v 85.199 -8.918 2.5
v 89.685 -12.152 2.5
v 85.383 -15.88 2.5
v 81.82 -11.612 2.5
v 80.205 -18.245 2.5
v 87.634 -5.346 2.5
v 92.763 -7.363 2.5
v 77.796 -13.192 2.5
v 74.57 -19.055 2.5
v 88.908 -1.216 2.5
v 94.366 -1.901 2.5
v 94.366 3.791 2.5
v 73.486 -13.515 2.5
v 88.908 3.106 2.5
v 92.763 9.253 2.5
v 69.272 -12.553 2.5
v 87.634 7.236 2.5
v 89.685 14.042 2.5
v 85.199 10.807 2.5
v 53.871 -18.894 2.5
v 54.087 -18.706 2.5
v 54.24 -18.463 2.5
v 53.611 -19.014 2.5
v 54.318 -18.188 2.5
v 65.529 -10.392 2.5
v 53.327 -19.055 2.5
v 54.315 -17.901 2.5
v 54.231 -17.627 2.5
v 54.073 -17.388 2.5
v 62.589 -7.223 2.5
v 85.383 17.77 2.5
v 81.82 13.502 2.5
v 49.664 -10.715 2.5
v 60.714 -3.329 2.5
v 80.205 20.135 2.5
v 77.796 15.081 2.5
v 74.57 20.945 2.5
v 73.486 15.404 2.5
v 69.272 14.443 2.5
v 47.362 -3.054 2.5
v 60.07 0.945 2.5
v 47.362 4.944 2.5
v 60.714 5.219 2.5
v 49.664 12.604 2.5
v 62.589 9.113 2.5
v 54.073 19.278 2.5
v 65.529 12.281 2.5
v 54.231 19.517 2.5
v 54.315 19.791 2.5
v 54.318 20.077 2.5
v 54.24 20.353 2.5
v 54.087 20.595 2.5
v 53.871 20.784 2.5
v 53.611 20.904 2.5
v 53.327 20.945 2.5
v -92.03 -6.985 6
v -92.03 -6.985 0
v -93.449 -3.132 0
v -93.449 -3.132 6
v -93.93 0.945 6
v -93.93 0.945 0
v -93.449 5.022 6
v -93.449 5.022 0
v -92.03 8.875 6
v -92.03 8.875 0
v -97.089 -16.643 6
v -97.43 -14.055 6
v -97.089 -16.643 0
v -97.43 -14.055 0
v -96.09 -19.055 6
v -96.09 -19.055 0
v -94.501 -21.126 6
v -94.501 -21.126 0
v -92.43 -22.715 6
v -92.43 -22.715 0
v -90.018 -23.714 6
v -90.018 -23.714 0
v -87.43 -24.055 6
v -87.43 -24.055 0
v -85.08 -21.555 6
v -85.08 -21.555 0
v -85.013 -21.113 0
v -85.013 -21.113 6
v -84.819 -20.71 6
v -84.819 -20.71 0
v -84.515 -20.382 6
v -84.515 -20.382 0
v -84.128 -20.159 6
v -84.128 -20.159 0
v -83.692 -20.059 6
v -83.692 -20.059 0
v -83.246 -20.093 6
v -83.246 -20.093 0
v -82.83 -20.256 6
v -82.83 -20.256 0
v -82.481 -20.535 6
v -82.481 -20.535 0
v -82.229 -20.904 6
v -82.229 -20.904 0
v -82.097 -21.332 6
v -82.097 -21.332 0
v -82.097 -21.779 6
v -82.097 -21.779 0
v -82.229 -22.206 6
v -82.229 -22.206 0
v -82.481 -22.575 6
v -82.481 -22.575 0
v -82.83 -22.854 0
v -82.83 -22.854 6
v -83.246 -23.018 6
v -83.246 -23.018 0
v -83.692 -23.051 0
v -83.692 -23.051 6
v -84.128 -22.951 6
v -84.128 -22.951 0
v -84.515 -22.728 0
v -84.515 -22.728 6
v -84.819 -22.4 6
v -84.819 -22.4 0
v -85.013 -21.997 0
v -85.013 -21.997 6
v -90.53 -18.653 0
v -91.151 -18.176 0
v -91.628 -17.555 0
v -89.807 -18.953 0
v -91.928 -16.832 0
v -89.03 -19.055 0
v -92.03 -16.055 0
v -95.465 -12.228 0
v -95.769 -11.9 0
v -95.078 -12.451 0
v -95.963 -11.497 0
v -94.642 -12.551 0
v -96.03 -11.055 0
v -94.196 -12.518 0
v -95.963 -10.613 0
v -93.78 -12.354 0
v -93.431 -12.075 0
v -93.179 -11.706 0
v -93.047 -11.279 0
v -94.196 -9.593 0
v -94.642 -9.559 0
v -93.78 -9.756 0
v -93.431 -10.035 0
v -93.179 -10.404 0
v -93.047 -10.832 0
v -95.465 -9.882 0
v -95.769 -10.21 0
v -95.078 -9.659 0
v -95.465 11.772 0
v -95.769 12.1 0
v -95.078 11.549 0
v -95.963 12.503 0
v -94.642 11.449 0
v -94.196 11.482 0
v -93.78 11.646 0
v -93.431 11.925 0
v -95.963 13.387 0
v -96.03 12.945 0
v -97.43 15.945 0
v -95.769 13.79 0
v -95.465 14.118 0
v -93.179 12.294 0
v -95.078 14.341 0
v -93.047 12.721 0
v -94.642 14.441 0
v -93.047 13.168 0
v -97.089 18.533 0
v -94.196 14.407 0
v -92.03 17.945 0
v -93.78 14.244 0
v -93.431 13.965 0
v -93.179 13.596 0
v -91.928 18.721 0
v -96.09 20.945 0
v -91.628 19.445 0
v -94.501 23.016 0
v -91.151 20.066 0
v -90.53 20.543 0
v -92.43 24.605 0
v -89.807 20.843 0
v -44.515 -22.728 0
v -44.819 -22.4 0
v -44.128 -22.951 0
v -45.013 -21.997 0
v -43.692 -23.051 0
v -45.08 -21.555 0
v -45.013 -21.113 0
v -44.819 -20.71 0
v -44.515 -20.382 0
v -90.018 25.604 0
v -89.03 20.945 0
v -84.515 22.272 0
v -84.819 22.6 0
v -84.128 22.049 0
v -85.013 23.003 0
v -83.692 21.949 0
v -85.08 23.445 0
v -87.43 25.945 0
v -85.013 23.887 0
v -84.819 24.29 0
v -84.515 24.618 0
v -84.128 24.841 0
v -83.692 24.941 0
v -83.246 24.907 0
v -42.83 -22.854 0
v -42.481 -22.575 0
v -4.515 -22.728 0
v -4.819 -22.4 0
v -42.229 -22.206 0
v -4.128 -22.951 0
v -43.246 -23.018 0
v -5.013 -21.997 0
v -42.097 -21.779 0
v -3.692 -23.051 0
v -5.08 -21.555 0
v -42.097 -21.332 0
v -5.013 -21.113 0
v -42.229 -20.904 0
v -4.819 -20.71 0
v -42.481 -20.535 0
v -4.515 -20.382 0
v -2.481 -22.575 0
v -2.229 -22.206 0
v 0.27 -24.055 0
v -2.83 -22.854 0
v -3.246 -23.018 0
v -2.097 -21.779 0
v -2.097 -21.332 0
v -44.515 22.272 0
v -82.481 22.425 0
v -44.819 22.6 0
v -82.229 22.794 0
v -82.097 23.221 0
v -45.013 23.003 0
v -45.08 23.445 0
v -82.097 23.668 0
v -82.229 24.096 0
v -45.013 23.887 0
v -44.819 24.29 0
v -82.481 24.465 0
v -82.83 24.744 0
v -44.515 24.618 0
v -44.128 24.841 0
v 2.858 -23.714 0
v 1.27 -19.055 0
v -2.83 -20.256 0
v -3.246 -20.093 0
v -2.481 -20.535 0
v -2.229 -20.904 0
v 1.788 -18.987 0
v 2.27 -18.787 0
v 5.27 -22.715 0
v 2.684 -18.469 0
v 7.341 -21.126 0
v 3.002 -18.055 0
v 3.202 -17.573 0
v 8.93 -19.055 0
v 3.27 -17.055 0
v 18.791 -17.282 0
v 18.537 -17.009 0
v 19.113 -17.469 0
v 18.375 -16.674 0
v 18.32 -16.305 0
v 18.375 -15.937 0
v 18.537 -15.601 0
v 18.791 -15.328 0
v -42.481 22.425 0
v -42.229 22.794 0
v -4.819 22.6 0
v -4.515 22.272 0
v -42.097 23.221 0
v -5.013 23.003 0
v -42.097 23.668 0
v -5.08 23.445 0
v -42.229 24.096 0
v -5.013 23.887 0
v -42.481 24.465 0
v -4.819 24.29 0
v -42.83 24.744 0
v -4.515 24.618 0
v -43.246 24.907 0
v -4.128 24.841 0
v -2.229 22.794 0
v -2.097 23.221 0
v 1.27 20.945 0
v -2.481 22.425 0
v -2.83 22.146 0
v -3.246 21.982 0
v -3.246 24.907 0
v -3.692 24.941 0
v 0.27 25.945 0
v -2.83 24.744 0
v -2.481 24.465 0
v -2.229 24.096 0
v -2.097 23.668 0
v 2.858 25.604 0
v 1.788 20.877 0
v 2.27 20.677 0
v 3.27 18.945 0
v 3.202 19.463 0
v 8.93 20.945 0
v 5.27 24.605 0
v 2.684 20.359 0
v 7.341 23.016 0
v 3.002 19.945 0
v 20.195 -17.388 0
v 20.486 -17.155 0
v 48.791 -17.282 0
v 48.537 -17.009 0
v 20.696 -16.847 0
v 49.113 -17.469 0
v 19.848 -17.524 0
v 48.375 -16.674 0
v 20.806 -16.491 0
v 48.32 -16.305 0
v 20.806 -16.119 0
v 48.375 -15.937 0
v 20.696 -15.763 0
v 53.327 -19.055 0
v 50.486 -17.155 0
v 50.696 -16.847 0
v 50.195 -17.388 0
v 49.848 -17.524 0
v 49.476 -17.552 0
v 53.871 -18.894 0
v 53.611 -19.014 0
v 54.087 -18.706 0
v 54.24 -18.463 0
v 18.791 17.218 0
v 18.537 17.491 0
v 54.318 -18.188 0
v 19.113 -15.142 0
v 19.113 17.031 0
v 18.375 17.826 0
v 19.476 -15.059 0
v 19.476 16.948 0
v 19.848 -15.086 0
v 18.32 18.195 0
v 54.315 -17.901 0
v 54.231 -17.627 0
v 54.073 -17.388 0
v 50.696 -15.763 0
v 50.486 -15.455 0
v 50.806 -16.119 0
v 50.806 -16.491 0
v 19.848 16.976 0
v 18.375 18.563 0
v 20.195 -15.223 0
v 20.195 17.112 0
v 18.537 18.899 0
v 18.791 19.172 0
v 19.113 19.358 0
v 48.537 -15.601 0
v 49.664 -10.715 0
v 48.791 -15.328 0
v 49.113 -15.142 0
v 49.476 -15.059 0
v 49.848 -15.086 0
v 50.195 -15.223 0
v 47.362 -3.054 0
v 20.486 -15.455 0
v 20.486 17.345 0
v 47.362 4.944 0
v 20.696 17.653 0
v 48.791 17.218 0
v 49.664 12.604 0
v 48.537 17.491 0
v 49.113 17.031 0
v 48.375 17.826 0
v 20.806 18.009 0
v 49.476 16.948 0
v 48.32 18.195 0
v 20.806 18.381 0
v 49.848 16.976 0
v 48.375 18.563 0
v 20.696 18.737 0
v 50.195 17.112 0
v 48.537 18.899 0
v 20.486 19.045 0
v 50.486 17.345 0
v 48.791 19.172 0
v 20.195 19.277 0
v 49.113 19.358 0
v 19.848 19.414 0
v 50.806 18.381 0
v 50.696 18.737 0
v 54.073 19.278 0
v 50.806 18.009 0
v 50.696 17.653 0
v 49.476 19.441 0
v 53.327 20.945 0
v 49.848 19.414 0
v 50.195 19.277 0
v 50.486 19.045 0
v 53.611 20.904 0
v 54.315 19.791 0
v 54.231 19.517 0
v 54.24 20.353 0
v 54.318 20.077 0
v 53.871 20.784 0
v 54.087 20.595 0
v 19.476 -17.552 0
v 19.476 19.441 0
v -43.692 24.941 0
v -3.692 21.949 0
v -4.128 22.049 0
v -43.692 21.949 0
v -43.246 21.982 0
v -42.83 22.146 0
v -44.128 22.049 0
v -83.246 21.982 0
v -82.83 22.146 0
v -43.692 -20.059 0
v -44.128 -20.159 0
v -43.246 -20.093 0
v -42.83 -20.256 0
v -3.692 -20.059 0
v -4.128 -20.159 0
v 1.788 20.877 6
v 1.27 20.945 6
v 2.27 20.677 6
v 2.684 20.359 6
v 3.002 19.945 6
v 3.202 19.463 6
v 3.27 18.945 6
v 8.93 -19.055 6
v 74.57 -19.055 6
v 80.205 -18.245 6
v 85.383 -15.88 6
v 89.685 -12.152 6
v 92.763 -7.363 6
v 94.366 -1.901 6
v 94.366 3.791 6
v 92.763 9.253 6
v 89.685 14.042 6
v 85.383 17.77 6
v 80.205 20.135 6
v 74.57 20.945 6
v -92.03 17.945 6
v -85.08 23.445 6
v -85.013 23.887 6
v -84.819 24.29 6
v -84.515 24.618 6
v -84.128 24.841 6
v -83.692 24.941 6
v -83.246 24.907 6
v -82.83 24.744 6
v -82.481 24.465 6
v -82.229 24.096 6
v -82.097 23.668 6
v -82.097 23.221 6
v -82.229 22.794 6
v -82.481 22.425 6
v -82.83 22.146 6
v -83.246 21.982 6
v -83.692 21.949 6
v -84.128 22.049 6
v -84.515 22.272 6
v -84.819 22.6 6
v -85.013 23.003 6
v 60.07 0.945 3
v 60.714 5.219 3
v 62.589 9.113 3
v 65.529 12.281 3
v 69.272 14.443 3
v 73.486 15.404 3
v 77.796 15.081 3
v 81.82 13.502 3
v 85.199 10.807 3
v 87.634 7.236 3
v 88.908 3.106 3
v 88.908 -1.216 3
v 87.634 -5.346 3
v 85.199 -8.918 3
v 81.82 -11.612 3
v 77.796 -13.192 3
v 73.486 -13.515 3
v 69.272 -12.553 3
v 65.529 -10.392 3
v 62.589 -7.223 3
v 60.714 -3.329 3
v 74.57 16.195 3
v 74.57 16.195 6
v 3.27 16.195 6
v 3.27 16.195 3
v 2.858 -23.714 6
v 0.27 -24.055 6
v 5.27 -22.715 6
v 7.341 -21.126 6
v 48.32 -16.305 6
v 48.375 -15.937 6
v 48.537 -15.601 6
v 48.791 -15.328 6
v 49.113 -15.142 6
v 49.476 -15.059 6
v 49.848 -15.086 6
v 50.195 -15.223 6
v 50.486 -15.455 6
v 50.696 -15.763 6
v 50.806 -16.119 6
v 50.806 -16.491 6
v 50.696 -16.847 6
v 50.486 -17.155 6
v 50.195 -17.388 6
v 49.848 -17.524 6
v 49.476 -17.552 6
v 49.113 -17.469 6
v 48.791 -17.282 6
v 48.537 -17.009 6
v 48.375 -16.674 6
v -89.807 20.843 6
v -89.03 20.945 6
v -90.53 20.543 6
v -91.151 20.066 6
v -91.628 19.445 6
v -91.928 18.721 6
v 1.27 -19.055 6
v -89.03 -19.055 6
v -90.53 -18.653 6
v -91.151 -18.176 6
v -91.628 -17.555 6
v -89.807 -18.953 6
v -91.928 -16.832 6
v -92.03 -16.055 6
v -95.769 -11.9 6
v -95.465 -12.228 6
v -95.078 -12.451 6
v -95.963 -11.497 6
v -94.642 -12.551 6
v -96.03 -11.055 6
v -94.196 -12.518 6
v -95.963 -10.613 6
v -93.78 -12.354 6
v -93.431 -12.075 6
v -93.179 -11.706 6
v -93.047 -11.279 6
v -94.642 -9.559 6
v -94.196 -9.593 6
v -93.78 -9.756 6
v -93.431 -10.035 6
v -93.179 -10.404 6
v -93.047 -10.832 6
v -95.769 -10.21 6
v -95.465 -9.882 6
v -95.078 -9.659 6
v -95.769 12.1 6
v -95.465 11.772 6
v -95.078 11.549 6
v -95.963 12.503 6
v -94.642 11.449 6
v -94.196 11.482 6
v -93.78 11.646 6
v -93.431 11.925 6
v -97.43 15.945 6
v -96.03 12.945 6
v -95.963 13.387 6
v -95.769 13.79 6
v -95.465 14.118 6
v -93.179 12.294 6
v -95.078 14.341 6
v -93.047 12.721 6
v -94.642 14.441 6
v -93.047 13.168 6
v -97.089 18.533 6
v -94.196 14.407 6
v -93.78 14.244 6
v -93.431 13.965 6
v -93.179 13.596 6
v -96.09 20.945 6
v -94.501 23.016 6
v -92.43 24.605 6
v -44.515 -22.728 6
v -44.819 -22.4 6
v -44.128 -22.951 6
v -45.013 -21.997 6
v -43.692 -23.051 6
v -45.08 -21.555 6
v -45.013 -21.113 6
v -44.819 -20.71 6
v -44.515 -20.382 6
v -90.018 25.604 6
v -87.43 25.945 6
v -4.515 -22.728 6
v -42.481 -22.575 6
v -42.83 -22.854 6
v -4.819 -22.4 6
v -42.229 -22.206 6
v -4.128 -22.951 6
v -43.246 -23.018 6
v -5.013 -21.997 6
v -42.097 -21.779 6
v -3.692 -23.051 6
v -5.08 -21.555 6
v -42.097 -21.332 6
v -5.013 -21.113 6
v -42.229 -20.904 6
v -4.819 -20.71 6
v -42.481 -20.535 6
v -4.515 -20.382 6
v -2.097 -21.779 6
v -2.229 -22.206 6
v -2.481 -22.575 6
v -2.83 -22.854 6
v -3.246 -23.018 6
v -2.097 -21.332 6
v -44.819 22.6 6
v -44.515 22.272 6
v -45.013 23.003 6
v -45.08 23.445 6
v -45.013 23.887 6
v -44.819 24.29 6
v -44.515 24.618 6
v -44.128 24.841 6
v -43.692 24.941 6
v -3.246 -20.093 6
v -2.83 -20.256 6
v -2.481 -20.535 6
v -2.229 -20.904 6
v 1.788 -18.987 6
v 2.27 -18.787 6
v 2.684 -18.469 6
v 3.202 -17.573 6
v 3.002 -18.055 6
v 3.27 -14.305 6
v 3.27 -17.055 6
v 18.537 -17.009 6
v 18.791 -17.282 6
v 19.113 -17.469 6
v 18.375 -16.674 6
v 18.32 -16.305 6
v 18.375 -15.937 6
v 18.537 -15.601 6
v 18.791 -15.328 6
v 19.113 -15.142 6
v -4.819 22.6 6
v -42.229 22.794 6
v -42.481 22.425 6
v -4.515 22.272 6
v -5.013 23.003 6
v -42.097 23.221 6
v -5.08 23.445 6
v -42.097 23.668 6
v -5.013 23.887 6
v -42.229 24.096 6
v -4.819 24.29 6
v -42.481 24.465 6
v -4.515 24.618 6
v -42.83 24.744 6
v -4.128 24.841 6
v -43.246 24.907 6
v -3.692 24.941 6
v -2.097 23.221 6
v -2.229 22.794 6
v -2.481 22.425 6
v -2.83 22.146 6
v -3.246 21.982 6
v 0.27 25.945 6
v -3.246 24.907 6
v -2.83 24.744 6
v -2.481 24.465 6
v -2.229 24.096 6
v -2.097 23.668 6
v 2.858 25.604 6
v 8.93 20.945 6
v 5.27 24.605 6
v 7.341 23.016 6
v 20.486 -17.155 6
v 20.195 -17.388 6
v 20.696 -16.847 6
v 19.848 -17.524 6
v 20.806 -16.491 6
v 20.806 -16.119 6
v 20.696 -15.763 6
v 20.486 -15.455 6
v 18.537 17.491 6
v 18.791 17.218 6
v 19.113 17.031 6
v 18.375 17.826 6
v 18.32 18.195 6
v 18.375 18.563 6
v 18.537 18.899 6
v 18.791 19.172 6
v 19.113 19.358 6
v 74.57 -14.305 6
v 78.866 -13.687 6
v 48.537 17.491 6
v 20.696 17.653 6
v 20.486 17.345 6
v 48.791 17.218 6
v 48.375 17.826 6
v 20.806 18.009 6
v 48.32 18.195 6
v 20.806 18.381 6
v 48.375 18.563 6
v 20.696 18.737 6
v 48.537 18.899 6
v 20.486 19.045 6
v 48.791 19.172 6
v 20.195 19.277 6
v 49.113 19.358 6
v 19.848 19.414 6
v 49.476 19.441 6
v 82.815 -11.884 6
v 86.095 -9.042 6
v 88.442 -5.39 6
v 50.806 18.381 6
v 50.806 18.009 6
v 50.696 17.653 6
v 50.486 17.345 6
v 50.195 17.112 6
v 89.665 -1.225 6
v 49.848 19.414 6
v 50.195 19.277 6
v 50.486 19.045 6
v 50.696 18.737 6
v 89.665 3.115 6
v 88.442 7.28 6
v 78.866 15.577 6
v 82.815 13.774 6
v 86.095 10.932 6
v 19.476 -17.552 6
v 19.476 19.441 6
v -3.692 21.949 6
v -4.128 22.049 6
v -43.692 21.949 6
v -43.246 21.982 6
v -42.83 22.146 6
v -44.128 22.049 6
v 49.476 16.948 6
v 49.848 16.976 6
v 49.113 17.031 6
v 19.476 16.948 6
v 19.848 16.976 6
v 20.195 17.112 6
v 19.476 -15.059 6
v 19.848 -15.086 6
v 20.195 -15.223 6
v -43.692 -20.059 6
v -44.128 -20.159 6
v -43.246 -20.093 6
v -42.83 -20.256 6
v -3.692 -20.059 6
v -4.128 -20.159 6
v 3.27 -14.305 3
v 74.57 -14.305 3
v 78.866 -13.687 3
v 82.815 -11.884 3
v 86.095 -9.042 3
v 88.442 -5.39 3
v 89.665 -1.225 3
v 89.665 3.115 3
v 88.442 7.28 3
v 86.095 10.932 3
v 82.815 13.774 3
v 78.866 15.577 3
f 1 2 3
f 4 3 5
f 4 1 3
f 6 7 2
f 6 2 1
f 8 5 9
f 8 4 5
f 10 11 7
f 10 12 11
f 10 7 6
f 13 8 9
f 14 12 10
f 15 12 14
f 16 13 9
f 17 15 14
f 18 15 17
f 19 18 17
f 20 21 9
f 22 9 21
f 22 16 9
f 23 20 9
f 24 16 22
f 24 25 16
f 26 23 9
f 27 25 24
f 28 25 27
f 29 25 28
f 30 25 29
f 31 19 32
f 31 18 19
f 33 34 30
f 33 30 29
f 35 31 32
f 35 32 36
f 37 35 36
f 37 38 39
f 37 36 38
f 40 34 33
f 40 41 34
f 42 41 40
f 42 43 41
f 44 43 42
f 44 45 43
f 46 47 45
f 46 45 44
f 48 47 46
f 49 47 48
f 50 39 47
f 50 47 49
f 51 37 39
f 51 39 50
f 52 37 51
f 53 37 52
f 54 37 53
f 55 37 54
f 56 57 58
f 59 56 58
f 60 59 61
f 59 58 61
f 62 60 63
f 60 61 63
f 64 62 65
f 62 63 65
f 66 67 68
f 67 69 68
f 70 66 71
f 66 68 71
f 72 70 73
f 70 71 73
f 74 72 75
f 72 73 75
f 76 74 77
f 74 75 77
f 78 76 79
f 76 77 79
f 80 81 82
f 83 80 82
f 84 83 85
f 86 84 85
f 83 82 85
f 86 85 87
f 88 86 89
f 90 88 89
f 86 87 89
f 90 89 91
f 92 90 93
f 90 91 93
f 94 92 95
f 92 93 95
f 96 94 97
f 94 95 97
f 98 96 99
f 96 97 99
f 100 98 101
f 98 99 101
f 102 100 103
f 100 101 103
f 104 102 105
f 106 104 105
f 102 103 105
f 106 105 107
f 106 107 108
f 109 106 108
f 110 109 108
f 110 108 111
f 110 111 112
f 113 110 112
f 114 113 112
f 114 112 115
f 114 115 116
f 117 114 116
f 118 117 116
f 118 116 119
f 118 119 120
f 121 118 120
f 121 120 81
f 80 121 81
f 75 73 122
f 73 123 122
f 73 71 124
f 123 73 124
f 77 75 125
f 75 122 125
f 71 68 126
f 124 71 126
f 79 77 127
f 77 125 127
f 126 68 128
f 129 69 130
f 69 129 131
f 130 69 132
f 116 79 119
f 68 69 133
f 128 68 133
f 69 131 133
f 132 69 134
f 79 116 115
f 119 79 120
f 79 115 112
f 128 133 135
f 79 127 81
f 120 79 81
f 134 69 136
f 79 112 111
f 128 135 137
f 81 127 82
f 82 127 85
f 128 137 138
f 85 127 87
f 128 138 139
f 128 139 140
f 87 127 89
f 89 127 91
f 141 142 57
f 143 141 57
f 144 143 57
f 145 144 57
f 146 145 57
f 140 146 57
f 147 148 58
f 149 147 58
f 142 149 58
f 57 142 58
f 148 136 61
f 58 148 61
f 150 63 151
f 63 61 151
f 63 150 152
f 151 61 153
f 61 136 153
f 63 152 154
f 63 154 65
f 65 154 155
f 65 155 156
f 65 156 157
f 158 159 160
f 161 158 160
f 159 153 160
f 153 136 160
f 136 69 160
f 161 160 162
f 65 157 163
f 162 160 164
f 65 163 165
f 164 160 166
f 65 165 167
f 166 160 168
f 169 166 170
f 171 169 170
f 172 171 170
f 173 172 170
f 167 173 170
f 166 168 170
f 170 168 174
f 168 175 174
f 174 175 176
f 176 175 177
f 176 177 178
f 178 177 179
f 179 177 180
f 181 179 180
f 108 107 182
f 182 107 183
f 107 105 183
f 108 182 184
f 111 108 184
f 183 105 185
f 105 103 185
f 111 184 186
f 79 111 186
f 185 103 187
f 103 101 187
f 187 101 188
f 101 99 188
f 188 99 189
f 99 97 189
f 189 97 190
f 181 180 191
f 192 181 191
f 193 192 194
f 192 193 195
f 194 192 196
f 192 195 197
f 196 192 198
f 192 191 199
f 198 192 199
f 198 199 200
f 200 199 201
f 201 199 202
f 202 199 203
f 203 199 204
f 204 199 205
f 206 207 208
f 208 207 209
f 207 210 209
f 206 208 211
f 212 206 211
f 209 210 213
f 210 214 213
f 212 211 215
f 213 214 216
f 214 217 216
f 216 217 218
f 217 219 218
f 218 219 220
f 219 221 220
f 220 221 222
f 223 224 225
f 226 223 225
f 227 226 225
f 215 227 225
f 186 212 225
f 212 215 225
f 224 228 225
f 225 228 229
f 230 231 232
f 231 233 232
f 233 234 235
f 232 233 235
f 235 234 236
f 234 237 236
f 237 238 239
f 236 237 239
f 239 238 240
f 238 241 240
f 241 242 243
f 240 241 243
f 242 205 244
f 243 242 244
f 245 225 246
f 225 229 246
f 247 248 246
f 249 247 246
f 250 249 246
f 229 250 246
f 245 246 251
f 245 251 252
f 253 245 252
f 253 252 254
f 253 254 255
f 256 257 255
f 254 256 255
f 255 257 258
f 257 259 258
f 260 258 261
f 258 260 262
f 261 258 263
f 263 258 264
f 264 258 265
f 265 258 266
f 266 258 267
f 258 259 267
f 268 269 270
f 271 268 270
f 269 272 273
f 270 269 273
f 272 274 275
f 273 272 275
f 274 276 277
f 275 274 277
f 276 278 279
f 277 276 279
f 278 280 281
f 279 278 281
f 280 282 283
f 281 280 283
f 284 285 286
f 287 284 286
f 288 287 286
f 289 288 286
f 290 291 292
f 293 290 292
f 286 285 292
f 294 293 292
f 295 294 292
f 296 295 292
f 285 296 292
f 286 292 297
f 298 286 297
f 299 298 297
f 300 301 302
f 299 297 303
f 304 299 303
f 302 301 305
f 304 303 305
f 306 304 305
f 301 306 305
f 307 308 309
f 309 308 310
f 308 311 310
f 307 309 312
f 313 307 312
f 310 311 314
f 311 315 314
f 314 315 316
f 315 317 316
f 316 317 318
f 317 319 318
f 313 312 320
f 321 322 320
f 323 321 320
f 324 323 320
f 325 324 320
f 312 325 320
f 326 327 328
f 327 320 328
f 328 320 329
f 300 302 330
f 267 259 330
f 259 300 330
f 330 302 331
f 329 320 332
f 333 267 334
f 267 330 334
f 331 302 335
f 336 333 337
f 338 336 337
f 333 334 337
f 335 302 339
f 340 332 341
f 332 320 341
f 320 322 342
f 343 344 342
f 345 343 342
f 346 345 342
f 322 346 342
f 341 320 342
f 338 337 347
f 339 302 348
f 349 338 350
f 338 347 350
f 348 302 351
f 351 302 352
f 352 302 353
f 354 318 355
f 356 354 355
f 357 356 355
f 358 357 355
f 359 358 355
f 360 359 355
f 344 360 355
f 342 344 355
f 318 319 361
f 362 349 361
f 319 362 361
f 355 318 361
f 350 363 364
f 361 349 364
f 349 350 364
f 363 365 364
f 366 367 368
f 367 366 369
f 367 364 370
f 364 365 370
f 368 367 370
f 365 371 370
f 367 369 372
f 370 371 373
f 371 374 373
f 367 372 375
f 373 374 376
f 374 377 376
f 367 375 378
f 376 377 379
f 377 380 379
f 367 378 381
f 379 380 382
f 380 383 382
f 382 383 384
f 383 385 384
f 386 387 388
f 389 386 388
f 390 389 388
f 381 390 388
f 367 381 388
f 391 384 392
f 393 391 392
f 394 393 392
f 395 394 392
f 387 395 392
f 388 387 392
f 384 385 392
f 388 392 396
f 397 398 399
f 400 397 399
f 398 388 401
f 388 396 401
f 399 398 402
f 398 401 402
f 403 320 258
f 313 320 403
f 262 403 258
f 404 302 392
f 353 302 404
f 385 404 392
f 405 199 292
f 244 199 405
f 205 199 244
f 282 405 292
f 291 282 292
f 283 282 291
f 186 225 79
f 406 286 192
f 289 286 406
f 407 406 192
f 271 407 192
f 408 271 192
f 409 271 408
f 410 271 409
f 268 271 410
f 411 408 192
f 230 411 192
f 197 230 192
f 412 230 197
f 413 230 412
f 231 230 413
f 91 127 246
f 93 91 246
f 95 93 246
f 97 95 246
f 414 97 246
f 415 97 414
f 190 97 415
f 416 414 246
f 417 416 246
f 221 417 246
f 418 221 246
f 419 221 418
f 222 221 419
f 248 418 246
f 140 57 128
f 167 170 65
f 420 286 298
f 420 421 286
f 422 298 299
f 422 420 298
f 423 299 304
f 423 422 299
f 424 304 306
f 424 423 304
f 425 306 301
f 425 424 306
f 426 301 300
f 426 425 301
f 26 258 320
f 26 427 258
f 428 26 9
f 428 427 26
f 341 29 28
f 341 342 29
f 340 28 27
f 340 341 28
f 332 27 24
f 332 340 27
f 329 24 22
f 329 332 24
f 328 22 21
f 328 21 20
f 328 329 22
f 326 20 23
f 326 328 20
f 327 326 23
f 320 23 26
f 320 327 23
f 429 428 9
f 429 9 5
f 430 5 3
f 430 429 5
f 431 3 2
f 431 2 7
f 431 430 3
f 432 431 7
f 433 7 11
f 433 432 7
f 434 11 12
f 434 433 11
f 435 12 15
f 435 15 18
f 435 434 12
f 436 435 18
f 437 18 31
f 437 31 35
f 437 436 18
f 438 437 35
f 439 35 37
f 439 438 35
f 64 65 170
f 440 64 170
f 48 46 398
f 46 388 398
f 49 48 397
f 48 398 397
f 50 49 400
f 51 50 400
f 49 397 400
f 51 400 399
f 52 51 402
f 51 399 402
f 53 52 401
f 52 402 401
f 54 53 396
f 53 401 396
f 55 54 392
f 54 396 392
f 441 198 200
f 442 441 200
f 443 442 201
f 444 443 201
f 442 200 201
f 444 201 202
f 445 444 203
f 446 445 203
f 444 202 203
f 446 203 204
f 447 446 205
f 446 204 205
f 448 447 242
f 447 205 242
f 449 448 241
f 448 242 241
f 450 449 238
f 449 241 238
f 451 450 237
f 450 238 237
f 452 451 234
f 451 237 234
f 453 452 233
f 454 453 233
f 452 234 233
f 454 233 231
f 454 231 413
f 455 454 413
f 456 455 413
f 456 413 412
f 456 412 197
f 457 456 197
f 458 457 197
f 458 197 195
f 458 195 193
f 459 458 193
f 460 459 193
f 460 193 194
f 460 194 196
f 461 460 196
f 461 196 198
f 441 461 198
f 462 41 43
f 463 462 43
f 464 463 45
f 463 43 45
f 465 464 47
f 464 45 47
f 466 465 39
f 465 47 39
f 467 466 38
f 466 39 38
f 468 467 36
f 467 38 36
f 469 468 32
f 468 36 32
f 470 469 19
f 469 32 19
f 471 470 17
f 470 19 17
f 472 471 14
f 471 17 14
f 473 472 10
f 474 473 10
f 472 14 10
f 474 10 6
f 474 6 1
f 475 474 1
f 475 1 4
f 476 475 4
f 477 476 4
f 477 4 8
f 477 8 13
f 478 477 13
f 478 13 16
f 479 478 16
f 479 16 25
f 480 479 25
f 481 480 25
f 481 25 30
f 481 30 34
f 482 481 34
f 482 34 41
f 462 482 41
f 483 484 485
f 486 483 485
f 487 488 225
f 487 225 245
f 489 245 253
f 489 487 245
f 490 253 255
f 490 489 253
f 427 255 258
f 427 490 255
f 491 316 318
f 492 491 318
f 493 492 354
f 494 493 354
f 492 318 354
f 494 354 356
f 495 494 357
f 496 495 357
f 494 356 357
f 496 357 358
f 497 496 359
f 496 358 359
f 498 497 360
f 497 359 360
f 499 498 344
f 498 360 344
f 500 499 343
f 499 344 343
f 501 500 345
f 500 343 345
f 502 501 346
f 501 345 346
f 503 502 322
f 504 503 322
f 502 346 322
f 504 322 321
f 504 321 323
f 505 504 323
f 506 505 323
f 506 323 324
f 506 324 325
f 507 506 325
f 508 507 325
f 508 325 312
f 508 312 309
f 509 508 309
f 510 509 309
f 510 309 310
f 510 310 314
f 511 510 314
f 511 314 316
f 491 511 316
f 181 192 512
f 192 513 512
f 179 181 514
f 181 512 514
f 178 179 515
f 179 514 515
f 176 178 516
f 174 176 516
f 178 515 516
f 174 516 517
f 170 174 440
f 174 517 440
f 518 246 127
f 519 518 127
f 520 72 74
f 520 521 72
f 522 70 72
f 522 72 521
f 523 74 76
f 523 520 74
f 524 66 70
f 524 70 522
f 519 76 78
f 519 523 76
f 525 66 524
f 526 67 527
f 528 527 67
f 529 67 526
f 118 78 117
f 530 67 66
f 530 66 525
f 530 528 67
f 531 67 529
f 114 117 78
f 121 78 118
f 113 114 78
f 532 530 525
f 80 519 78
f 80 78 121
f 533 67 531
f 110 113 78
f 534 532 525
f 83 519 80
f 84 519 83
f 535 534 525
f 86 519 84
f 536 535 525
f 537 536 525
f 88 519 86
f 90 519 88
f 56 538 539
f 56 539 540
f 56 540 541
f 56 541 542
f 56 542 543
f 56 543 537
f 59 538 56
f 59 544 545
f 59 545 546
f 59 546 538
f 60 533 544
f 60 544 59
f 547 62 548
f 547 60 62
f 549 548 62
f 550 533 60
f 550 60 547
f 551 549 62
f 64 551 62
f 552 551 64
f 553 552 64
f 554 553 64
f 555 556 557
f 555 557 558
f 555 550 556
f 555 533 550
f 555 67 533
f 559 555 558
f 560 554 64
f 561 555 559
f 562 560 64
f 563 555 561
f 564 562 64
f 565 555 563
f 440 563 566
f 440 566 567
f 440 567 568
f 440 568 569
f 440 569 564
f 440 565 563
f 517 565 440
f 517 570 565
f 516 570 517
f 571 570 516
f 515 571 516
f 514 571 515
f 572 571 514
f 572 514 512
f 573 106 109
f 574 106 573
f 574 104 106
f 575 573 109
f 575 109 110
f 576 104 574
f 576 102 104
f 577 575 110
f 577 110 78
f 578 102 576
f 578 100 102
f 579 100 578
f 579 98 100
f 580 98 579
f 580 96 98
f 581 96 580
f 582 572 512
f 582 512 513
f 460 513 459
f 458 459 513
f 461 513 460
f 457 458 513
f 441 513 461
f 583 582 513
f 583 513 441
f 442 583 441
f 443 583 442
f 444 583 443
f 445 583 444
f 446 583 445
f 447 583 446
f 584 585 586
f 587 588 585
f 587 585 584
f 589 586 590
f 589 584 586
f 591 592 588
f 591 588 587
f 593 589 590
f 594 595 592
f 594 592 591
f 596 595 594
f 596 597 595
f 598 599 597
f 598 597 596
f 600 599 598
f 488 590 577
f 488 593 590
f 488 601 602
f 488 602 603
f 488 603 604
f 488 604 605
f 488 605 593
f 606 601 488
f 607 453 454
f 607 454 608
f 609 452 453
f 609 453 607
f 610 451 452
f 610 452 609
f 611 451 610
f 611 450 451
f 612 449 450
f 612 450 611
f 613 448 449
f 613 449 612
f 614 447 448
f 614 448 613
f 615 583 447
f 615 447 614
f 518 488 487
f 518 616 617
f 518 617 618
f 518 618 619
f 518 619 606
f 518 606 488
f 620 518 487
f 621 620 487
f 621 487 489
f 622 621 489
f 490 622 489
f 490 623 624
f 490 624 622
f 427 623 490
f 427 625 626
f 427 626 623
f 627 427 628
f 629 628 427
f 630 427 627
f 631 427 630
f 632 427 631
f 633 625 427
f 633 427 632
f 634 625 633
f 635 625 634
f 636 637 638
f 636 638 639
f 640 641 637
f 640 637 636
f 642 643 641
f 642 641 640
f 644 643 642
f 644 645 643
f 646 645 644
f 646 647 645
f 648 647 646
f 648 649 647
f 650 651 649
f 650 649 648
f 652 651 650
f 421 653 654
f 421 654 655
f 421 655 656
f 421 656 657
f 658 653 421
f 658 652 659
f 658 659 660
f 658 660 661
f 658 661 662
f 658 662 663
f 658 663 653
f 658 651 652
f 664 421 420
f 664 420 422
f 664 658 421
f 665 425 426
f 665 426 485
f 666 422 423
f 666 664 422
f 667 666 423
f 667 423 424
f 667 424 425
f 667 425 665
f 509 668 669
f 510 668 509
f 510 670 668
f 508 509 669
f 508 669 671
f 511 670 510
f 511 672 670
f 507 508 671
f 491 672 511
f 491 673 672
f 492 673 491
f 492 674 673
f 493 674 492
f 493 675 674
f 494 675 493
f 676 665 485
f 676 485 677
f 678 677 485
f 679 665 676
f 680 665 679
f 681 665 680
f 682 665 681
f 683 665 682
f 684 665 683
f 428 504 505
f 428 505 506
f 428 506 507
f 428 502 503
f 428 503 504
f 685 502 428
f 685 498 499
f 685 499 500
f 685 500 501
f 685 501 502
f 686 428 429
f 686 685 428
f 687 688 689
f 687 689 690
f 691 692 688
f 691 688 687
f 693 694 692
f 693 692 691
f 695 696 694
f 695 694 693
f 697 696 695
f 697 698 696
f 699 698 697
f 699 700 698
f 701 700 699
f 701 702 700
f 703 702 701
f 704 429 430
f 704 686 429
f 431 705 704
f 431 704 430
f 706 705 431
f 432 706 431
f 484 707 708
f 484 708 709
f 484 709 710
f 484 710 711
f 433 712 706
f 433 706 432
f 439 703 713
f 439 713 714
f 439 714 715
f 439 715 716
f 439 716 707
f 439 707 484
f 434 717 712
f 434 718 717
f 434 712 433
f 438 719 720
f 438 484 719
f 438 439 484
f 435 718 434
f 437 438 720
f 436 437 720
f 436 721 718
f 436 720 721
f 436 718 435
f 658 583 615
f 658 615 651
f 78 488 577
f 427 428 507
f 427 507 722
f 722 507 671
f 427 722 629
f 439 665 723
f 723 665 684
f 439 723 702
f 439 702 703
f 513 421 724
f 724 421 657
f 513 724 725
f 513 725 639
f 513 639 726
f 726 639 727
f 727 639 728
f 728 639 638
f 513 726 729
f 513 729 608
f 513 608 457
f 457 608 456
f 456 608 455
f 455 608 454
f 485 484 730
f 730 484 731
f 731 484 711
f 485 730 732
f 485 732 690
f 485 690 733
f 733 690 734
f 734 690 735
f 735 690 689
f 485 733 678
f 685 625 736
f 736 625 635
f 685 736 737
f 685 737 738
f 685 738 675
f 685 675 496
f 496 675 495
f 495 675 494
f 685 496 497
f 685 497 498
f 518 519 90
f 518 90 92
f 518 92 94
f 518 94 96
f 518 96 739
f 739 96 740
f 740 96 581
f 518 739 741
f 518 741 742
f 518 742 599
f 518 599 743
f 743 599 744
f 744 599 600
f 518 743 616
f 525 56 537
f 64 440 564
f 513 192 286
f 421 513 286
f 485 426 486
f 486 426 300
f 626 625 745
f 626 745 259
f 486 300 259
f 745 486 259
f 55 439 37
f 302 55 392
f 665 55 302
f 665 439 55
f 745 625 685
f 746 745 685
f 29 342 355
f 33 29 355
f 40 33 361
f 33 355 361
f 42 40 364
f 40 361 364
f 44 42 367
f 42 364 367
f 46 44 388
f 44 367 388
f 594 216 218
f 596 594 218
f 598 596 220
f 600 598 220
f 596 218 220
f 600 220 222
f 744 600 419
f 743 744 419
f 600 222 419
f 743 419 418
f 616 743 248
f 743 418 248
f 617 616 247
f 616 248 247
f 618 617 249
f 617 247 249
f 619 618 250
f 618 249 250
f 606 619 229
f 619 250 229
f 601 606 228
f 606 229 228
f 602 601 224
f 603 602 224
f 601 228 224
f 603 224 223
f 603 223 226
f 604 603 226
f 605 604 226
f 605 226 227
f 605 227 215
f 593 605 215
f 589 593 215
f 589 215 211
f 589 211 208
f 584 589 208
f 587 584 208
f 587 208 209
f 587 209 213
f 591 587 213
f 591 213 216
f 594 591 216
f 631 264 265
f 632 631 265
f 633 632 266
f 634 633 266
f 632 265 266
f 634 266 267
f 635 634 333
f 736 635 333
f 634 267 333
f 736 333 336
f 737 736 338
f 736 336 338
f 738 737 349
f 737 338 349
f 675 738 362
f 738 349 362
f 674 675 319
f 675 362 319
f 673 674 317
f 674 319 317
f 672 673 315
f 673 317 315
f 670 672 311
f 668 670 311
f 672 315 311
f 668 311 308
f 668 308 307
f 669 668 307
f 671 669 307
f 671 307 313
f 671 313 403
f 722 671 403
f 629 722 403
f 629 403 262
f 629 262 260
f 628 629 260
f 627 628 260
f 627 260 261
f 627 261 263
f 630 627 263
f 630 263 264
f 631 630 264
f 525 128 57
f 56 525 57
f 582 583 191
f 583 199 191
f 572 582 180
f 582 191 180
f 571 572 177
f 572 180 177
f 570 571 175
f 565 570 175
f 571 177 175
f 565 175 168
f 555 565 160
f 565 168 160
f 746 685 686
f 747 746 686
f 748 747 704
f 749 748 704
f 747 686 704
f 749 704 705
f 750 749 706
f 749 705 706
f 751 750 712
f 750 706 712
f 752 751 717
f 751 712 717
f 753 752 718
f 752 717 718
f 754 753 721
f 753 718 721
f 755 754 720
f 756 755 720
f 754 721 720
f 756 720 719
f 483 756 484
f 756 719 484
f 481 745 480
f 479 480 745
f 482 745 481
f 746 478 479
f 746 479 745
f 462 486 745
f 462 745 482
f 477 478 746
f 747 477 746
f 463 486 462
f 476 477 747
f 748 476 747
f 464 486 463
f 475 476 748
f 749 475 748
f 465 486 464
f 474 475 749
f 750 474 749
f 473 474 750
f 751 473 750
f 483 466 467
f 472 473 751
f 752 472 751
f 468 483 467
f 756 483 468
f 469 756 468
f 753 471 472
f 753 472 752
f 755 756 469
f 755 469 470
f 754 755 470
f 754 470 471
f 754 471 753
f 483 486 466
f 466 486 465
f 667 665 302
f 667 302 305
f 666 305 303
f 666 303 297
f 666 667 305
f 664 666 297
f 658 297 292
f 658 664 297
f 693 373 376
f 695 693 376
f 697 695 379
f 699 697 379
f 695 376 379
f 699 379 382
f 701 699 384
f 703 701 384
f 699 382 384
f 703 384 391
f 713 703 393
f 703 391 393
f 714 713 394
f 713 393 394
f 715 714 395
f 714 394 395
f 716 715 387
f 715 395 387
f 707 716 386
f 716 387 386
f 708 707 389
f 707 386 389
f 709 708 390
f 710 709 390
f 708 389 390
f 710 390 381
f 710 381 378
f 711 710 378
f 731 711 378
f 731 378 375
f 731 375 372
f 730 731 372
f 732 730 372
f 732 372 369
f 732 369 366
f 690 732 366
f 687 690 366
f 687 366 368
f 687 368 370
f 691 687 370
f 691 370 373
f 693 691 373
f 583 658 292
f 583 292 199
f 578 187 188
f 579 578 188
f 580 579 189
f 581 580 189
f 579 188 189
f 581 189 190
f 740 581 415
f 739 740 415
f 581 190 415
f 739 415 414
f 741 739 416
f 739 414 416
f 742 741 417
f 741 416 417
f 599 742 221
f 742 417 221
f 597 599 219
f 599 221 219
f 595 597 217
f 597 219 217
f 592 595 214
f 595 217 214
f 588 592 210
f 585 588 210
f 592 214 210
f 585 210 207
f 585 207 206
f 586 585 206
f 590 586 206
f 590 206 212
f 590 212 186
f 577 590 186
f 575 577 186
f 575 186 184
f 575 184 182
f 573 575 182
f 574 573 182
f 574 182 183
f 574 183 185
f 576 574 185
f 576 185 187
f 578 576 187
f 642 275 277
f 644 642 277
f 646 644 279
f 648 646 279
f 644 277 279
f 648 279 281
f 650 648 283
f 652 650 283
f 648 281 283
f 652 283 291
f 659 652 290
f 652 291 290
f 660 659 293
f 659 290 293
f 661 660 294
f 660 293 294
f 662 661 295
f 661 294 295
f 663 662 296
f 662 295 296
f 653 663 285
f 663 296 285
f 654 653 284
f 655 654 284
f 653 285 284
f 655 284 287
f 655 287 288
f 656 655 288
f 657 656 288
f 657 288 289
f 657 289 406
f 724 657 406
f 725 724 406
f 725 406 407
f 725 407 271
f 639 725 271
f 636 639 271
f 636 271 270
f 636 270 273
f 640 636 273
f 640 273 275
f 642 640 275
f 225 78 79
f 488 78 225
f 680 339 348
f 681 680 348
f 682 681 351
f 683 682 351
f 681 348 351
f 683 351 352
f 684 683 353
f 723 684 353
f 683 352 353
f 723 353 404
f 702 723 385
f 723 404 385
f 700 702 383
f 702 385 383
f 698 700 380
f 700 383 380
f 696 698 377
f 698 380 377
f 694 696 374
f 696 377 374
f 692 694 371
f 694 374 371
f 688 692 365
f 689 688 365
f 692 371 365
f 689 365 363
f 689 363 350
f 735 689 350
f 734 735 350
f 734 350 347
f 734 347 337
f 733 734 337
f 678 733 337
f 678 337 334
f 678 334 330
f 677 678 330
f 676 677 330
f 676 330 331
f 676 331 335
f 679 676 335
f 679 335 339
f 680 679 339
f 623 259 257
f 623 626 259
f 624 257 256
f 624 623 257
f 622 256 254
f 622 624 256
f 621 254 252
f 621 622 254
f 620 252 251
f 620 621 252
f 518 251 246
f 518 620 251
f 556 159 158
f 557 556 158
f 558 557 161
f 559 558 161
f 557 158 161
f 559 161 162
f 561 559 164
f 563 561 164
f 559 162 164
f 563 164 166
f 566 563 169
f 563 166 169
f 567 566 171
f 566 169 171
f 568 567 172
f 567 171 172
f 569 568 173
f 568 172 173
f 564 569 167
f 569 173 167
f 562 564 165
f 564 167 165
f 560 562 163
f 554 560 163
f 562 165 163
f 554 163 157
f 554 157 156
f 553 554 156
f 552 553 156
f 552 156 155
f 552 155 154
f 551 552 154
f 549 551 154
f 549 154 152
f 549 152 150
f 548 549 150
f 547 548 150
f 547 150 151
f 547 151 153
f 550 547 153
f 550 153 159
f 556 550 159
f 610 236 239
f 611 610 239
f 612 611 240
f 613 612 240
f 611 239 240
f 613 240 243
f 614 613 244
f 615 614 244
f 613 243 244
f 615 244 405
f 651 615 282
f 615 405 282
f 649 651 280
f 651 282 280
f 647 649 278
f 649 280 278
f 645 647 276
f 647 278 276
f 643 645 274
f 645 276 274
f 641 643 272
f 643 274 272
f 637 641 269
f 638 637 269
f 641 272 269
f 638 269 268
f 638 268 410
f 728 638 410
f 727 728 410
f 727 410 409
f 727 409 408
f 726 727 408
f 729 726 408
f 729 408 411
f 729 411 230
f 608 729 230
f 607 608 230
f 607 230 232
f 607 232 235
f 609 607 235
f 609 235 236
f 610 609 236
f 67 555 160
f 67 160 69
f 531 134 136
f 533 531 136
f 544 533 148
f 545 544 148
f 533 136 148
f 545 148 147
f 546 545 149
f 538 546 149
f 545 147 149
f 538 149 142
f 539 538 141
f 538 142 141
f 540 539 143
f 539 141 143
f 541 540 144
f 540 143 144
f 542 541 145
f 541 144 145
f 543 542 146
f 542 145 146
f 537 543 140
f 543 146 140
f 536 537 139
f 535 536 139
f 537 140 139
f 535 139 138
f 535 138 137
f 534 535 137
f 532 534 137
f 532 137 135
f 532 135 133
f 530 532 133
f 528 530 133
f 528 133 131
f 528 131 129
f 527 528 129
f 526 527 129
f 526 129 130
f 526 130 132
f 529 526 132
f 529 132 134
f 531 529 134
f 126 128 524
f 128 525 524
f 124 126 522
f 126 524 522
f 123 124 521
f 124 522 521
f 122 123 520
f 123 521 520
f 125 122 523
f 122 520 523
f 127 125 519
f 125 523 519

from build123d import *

# Parameters (mm, degrees)
BOSS_EXTRUDE1_DEPTH       = 6
CUT_EXTRUDE1_DEPTH        = 102.003801713
CUT_EXTRUDE2_DEPTH        = 3
F_2_CLEARANCE_HOLE1_D     = 2.5
F_1_1_8_CLEARANCE_HOLE1_D = 29
F_3_CLEARANCE_HOLE1_D     = 3
FILLET1_R                 = 2
FILLET2_R                 = 3
FILLET3_R                 = 10
SKETCH10_R                = 27.5
CUT_EXTRUDE3_DEPTH        = 2.5
FILLET4_R                 = 1


with BuildPart() as part:
    # Sketch1 → Boss-Extrude1 (new body)
    with BuildSketch(Plane.XY.offset(6)):
        with BuildLine():
            Line((74.569864729, 20.944878138), (8.930118766, 20.944878138))
            ThreePointArc((8.930118766, 20.944878138), (5.269864729, 24.605132176), (0.269864729, 25.944878138))
            Line((0.269864729, 25.944878138), (-97.430135271, 25.944878138))
            Line((-97.430135271, 25.944878138), (-97.430135271, -24.055121862))
            Line((-97.430135271, -24.055121862), (0.269864729, -24.055121862))
            ThreePointArc((0.269864729, -24.055121862), (5.269864729, -22.7153759), (8.930118767, -19.055121862))
            Line((8.930118767, -19.055121862), (74.569864729, -19.055121862))
            ThreePointArc((74.569864729, -19.055121862), (94.569864729, 0.944878138), (74.569864729, 20.944878138))
        make_face()
    extrude(amount=-BOSS_EXTRUDE1_DEPTH)

    # Sketch2 → Cut-Extrude1 (cut, through all)
    with BuildSketch(Plane(origin=(0, 0, 0), x_dir=(-1, 0, 0), z_dir=(0, 0, -1))):
        with BuildLine():
            Line((92.030135271, 20.944878138), (-3.269864729, 20.944878138))
            Line((-3.269864729, 20.944878138), (-3.269864729, -19.055121862))
            Line((-3.269864729, -19.055121862), (92.030135271, -19.055121862))
            Line((92.030135271, -19.055121862), (92.030135271, -6.985443419))
            ThreePointArc((92.030135271, -6.985443419), (93.930135271, 0.944878138), (92.030135271, 8.875199695))
            Line((92.030135271, 8.875199695), (92.030135271, 20.944878138))
        make_face()
    extrude(amount=-CUT_EXTRUDE1_DEPTH, mode=Mode.SUBTRACT)

    # Sketch3 → Cut-Extrude2 (cut)
    with BuildSketch(Plane.XY.offset(6)):
        with BuildLine():
            Line((74.569864729, 16.194878138), (3.269864729, 16.194878138))
            Line((3.269864729, 16.194878138), (3.269864729, -14.305121862))
            Line((3.269864729, -14.305121862), (74.569864729, -14.305121862))
            ThreePointArc((74.569864729, -14.305121862), (89.819864729, 0.944878138), (74.569864729, 16.194878138))
        make_face()
    extrude(amount=-CUT_EXTRUDE2_DEPTH, mode=Mode.SUBTRACT)

    # #2 Clearance Hole1 (through all)
    with Locations(Plane.XY.offset(6)):
        with Locations((49.569864729, 18.194878138), (19.569864729, -16.305121862), (19.569864729, 18.194878138), (49.569864729, -16.305121862)):
            Hole(F_2_CLEARANCE_HOLE1_D / 2)

    # 1-1/8 Clearance Hole1 (through all)
    with Locations(Plane.XY.offset(3)):
        with Locations((74.569864729, 0.944878138)):
            Hole(F_1_1_8_CLEARANCE_HOLE1_D / 2)

    # #3 Clearance Hole1 (through all)
    with Locations(Plane.XY.offset(6)):
        with Locations((-3.580135271, 23.444878138), (-43.580135271, 23.444878138), (-83.580135271, 23.444878138), (-94.530135271, 12.944878138), (-94.530135271, -11.055121862), (-43.580135271, -21.555121862), (-3.580135271, -21.555121862), (-83.580135271, -21.555121862)):
            Hole(F_3_CLEARANCE_HOLE1_D / 2)

    # Fillet1
    fillet1_edges = [part.edges().sort_by_distance(p)[0] for p in [
        (3.269864729, -19.055121862, 3),
        (3.269864729, 20.944878138, 3),
    ]]
    fillet(fillet1_edges, radius=FILLET1_R)

    # Fillet2
    fillet2_edges = [part.edges().sort_by_distance(p)[0] for p in [
        (-92.030135271, 20.944878138, 3),
        (-92.030135271, -19.055121862, 3),
    ]]
    fillet(fillet2_edges, radius=FILLET2_R)

    # Fillet3
    fillet3_edges = [part.edges().sort_by_distance(p)[0] for p in [
        (-97.430135271, -24.055121862, 3),
        (-97.430135271, 25.944878138, 3),
    ]]
    fillet(fillet3_edges, radius=FILLET3_R)

    # Sketch10 → Cut-Extrude3 (cut)
    with BuildSketch(Plane(origin=(0, 0, 0), x_dir=(-1, 0, 0), z_dir=(0, 0, -1))):
        with Locations((-74.569864729, 0.944878138)):
            Circle(SKETCH10_R)
    extrude(amount=-CUT_EXTRUDE3_DEPTH, mode=Mode.SUBTRACT)

    # Fillet4
    fillet4_edges = [part.edges().sort_by_distance(p)[0] for p in [
        (55.695278641, -19.055121862, 1.25),
        (55.695278641, 20.944878138, 1.25),
    ]]
    fillet(fillet4_edges, radius=FILLET4_R)


solid = part.part
